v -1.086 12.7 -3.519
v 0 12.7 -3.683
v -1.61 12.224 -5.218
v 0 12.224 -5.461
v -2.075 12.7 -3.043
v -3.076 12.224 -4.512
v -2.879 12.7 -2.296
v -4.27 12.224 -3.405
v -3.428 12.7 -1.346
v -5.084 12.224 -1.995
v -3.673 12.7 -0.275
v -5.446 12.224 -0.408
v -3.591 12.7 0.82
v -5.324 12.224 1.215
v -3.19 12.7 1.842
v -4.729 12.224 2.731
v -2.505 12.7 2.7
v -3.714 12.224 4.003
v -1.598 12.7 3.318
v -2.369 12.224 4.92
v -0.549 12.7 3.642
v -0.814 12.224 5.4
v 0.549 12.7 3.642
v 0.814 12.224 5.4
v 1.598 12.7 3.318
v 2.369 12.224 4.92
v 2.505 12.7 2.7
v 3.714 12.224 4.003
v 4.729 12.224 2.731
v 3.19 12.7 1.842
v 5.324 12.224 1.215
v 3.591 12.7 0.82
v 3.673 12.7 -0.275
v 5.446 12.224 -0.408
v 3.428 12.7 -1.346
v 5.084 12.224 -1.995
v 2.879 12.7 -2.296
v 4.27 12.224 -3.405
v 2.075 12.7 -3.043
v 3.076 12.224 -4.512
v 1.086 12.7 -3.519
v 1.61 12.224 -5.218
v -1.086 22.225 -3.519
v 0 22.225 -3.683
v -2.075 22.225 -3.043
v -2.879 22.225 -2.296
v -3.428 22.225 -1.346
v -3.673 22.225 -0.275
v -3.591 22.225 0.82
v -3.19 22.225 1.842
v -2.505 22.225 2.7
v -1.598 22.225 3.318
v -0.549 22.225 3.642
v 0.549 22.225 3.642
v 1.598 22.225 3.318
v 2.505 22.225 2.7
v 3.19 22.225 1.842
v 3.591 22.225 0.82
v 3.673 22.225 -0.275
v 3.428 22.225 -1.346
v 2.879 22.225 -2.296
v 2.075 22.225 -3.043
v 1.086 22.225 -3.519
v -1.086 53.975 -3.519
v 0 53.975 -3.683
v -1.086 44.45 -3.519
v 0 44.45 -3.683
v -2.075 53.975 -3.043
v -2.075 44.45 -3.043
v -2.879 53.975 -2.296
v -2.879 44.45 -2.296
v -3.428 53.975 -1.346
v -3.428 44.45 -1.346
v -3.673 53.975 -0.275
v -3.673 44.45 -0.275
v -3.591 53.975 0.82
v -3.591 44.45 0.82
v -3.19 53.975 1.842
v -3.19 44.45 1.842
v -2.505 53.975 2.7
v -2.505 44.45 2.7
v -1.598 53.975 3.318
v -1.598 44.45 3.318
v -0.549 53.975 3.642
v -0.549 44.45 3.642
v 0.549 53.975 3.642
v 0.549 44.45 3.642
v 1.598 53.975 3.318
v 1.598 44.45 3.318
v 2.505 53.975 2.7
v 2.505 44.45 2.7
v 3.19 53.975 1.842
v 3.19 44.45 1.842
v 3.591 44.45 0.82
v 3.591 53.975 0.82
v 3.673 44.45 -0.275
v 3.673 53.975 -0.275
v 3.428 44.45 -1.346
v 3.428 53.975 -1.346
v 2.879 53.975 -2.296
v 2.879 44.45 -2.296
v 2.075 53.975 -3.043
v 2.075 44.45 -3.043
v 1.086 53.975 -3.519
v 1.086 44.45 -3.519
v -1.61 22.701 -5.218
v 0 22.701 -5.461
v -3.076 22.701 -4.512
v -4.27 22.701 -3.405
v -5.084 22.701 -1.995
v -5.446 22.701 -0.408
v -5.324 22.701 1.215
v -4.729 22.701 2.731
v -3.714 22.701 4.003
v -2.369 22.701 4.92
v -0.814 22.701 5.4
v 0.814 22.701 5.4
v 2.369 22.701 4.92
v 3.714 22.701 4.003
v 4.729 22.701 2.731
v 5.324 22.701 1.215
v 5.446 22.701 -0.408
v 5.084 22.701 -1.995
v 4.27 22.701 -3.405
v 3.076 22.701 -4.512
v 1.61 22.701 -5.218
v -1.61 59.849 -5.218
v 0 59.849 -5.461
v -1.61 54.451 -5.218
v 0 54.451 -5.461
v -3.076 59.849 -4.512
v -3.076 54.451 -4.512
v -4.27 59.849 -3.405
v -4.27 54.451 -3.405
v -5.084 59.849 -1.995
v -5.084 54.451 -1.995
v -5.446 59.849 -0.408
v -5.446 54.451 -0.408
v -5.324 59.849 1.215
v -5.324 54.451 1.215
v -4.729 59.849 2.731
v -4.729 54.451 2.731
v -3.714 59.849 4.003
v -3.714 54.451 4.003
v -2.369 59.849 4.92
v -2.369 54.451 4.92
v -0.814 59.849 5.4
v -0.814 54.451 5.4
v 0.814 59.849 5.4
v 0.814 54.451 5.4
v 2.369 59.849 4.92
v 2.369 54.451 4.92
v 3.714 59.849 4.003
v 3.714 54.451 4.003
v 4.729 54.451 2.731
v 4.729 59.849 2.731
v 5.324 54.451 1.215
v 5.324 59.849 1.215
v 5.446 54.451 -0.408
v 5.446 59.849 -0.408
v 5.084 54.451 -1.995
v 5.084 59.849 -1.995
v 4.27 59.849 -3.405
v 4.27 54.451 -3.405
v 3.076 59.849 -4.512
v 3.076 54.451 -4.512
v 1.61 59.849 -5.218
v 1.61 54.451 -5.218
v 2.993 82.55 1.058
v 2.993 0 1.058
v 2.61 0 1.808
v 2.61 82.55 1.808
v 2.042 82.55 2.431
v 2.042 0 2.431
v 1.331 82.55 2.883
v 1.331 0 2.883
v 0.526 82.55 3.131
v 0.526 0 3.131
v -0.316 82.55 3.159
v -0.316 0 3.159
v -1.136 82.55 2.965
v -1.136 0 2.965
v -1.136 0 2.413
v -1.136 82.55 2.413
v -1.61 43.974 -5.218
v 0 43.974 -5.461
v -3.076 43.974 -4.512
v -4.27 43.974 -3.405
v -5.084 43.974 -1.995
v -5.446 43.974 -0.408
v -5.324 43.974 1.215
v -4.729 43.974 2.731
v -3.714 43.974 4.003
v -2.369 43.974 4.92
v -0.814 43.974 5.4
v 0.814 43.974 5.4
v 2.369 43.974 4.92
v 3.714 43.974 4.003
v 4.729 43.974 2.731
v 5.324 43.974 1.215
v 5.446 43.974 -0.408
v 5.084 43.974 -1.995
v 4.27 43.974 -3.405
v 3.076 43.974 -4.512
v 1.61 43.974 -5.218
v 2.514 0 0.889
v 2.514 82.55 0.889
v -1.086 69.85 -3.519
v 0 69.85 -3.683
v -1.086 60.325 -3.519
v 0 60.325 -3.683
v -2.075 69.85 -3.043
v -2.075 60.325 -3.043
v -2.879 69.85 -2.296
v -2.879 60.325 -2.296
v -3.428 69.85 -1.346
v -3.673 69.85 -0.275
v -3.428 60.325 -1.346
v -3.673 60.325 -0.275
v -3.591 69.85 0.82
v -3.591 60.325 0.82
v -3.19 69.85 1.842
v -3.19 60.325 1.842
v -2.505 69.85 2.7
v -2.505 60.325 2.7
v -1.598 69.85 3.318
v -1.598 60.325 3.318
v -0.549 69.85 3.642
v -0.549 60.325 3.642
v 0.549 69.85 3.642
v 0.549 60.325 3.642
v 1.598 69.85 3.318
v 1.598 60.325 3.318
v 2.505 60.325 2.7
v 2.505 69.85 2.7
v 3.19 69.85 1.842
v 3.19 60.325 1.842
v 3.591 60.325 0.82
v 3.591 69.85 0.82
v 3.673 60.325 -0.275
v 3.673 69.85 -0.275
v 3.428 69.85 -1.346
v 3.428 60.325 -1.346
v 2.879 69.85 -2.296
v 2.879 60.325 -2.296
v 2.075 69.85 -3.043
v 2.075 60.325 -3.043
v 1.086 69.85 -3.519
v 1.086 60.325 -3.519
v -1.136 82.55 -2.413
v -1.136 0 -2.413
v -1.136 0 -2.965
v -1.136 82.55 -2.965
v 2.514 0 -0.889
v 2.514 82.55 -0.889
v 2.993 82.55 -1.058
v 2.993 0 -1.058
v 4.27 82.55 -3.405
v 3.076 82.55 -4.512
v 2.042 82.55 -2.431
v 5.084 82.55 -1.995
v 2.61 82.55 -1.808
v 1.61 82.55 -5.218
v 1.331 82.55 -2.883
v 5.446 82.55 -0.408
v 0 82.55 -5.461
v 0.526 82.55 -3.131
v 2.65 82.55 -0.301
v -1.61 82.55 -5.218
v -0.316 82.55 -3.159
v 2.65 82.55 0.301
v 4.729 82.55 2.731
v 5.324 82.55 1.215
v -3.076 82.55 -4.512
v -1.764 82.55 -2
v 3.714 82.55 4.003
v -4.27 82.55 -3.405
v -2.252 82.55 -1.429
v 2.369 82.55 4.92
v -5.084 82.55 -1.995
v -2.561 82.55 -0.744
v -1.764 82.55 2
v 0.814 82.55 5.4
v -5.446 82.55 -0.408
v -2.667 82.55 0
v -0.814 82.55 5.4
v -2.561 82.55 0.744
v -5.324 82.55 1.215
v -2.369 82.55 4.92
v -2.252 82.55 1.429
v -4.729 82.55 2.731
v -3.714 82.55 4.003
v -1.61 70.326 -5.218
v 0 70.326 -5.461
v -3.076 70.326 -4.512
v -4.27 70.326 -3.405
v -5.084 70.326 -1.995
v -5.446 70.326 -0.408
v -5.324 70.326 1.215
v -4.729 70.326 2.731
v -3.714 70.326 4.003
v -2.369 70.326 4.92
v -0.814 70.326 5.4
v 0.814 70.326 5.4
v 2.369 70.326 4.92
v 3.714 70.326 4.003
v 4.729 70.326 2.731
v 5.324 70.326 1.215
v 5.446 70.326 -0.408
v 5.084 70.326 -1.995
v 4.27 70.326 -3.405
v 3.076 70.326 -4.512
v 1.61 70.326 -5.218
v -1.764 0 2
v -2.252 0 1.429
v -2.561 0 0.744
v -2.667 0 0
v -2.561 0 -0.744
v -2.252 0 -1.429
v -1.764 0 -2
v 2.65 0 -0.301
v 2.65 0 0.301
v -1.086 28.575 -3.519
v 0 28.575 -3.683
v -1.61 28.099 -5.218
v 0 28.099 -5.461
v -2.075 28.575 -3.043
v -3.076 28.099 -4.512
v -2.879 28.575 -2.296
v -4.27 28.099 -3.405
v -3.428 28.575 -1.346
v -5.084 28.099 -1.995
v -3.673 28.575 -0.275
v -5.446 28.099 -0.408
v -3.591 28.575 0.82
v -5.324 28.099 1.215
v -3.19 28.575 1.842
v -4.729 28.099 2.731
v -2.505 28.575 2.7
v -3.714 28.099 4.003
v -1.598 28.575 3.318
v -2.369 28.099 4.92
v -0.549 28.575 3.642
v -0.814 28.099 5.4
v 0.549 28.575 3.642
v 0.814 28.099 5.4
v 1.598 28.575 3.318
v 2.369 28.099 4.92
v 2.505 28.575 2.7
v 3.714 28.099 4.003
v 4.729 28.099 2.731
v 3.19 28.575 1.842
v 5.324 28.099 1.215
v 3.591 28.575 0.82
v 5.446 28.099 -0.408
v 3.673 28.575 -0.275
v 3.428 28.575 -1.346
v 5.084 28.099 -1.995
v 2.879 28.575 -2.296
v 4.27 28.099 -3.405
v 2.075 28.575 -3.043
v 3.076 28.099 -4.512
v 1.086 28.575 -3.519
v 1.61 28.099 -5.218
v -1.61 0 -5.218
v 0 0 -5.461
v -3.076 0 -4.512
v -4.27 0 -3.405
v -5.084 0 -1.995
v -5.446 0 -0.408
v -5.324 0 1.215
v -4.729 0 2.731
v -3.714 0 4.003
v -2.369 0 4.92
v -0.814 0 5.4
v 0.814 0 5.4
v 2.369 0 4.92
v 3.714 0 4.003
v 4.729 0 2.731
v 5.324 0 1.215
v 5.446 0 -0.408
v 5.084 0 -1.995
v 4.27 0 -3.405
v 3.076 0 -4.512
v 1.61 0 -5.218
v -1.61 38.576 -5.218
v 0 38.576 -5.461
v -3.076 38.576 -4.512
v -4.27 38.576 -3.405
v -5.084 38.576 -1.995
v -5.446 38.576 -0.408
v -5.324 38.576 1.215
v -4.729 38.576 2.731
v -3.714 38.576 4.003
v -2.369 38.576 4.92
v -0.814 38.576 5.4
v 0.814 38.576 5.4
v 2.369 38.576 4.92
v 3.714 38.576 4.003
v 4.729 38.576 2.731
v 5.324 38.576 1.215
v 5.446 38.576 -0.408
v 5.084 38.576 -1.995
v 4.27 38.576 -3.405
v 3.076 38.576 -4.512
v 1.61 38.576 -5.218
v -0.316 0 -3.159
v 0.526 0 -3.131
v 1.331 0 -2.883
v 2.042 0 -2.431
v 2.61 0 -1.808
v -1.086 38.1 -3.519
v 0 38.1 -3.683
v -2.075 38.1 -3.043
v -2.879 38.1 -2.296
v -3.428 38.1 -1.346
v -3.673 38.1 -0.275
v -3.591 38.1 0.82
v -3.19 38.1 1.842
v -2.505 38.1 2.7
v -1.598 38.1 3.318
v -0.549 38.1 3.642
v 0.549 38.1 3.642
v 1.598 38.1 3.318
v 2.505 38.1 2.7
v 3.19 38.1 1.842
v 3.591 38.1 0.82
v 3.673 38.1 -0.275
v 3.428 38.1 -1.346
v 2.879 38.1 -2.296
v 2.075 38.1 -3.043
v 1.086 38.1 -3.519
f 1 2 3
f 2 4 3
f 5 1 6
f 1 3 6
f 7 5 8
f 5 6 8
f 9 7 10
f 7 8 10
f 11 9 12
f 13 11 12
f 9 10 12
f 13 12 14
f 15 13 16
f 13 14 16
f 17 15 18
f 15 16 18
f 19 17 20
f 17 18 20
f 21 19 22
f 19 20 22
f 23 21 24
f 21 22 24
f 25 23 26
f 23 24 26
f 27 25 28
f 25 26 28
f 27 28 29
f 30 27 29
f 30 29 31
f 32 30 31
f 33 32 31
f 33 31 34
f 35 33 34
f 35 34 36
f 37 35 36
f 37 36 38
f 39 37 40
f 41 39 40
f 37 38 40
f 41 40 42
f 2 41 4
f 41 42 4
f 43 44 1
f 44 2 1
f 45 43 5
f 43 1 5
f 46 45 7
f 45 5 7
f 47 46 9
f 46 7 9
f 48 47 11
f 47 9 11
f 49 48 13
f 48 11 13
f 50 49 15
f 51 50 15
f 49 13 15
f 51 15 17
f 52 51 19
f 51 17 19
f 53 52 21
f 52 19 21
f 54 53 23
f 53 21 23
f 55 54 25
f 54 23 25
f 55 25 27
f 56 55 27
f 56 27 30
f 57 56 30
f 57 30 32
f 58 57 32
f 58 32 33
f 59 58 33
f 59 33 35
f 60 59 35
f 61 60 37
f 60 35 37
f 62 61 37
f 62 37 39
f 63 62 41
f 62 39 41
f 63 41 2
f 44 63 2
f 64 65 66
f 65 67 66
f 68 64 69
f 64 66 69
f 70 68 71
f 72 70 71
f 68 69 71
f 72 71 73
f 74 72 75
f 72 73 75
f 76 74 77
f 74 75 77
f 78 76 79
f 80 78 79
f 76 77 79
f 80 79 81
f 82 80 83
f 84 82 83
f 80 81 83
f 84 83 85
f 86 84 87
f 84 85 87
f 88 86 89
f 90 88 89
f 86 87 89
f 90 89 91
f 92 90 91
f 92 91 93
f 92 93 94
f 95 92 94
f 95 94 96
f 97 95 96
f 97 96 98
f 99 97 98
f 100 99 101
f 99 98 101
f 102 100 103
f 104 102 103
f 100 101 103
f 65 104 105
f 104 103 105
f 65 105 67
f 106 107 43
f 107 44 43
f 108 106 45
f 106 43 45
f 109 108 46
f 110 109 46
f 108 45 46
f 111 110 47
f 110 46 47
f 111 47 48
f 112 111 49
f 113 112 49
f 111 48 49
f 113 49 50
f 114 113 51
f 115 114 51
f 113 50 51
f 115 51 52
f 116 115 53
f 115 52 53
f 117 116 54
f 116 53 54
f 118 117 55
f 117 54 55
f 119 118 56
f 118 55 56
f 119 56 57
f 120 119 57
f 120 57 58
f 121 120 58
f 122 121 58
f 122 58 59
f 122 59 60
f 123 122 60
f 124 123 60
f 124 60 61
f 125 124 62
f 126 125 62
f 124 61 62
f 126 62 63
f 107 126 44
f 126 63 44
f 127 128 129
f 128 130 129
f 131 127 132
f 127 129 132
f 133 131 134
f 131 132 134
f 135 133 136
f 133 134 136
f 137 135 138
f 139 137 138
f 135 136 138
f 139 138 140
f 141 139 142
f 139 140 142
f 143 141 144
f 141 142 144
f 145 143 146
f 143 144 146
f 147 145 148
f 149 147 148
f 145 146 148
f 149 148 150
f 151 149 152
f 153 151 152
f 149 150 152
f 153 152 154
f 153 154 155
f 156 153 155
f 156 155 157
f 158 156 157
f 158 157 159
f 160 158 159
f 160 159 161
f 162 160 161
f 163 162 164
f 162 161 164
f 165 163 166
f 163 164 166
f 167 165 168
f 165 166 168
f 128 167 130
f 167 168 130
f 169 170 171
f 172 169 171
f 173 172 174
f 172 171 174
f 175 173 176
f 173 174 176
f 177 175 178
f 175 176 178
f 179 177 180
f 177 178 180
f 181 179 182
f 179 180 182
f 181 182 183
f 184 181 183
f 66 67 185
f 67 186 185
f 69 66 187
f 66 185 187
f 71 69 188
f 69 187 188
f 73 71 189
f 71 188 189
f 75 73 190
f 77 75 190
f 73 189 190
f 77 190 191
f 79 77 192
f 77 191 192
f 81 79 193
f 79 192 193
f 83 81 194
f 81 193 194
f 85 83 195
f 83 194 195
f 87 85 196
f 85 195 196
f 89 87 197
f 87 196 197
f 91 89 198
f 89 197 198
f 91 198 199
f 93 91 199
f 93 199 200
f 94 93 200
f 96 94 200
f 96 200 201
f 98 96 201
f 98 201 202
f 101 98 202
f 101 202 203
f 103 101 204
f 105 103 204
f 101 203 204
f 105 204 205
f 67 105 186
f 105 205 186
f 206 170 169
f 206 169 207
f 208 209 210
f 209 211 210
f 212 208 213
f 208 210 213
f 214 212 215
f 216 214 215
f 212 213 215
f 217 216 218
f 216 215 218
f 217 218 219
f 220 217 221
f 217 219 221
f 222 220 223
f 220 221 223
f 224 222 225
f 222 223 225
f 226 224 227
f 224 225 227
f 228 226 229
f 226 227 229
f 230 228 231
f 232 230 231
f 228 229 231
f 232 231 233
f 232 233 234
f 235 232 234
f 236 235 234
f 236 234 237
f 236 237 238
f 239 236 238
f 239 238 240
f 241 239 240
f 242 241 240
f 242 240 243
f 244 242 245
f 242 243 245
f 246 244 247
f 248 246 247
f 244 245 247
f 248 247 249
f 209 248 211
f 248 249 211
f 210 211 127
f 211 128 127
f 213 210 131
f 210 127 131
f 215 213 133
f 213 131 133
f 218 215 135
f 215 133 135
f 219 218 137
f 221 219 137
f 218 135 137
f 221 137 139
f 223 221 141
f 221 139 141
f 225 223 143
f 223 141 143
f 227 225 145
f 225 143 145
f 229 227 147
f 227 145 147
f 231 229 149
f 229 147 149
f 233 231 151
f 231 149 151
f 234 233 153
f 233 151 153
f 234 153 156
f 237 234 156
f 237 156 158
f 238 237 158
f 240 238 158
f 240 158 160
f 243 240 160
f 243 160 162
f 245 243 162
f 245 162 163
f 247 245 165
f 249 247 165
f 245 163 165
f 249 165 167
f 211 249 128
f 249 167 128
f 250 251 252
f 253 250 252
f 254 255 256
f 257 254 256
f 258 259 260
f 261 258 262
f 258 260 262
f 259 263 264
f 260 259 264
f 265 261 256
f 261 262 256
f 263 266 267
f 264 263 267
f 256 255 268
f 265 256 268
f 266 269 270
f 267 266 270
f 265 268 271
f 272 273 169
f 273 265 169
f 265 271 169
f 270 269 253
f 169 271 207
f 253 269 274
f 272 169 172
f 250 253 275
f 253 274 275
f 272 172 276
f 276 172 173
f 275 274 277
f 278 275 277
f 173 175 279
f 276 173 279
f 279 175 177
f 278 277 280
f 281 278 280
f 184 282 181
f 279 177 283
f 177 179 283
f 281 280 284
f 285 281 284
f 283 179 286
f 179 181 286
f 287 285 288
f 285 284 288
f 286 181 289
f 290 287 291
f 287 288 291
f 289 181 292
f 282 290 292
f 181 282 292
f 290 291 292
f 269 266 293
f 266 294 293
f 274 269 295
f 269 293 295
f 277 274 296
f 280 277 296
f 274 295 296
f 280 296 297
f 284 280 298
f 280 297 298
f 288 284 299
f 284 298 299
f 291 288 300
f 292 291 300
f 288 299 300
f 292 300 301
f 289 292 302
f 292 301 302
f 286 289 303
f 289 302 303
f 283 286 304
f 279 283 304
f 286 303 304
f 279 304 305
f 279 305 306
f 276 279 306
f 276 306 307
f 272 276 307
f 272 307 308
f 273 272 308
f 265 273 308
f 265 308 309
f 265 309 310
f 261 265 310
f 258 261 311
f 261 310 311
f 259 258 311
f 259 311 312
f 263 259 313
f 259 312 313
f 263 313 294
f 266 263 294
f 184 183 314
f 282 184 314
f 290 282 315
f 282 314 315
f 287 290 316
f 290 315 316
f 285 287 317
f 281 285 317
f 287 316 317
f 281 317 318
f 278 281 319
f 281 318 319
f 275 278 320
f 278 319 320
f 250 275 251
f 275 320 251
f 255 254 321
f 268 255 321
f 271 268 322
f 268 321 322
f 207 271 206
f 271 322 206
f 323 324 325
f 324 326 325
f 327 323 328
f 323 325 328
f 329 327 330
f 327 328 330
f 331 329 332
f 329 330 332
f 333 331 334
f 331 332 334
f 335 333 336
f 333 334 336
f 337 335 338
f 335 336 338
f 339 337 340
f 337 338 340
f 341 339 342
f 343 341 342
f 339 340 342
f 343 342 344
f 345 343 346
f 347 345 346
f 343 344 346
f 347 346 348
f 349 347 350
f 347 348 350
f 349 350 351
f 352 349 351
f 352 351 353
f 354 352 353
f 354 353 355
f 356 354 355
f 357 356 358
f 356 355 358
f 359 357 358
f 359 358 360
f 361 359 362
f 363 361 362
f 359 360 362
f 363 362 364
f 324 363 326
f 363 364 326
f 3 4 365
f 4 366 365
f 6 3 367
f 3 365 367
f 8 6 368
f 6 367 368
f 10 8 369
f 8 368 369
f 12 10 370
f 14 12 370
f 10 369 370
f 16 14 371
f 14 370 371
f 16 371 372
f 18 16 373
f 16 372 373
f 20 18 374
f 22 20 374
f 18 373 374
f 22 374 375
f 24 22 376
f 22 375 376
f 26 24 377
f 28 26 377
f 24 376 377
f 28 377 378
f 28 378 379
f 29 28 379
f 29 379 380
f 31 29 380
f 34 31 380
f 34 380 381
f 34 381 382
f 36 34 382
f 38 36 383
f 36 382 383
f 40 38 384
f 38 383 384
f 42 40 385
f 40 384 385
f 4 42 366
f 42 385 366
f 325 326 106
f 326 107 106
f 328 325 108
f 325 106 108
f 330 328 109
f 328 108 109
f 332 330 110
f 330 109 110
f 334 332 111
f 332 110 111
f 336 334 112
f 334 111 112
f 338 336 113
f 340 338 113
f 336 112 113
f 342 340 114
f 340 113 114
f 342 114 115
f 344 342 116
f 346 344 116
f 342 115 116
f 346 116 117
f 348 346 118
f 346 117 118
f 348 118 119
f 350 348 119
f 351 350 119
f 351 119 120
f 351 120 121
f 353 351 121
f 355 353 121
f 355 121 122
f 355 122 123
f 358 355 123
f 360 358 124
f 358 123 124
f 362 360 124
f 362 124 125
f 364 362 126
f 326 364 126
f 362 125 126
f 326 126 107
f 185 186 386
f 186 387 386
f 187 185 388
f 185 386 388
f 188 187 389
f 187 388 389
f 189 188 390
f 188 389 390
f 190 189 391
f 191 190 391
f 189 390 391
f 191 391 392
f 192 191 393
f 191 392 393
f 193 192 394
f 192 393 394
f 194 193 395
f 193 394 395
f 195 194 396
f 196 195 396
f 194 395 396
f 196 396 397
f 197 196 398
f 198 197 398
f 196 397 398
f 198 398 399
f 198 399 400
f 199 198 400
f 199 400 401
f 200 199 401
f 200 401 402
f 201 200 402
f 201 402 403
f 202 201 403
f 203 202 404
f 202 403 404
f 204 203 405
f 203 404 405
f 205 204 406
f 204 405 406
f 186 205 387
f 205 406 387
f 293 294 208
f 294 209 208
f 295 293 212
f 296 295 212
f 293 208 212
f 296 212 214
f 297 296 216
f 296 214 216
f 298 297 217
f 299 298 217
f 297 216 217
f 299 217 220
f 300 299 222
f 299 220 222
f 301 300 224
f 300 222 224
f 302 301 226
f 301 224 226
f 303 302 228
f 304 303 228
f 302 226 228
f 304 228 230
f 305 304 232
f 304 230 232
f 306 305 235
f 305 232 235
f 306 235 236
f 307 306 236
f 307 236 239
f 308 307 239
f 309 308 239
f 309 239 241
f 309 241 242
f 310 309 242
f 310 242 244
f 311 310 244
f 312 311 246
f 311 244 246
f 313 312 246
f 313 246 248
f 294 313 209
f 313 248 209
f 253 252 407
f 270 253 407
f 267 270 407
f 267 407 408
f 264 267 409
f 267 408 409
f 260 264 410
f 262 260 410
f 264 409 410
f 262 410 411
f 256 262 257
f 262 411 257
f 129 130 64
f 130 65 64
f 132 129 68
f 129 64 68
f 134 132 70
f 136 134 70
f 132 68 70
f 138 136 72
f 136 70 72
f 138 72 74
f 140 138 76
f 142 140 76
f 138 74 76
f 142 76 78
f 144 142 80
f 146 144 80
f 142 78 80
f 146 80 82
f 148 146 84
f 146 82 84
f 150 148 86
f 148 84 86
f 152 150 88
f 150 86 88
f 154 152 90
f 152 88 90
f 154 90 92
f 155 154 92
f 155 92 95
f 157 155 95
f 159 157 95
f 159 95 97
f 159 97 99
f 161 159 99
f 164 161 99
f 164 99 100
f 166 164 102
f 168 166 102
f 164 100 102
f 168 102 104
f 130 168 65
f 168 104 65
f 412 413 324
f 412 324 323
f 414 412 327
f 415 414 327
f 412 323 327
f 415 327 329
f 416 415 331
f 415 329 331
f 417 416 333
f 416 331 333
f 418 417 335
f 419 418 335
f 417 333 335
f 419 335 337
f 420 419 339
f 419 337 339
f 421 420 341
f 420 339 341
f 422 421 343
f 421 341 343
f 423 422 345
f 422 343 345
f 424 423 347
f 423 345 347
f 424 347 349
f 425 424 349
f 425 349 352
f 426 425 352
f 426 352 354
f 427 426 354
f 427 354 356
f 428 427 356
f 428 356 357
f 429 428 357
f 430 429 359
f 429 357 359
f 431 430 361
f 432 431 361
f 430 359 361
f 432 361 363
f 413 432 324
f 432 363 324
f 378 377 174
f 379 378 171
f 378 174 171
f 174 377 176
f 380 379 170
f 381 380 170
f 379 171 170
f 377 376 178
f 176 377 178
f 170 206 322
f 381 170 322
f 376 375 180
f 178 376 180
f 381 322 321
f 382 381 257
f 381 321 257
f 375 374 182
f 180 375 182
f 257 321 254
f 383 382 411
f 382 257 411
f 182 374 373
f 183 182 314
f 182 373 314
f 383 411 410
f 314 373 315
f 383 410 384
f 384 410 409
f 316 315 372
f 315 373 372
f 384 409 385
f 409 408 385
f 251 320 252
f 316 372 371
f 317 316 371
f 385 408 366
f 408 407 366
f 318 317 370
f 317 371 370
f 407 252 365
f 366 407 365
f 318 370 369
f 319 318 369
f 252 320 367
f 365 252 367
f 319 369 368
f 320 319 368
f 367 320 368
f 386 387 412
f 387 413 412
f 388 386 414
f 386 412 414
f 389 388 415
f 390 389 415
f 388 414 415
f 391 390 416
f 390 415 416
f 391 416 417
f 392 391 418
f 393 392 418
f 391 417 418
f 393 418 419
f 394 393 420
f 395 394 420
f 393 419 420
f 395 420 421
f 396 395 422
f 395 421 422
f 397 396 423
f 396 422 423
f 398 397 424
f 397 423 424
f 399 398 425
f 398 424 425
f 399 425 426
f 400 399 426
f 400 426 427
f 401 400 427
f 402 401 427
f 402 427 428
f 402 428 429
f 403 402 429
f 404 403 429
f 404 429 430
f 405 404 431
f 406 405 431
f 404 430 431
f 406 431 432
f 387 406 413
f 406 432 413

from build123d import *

# Parameters (mm, degrees)
POCKET_DEPTH = 82.551


with BuildPart() as part:
    # Sketch → Revolution (revolve)
    with BuildSketch(Plane.YZ):
        Polygon((0, 0), (82.55, 0), (82.55, -5.461), (70.326414, -5.461), (69.85, -3.683), (60.325, -3.683), (59.848586, -5.461), (54.451414, -5.461), (53.975, -3.683), (44.45, -3.683), (43.973586, -5.461), (38.576414, -5.461), (38.1, -3.683), (28.575, -3.683), (28.098586, -5.461), (22.701414, -5.461), (22.225, -3.683), (12.7, -3.683), (12.223586, -5.461), (0, -5.461), align=None)
    revolve(axis=Axis((0, 0, 0), (0, 1, 0)))

    # Sketch002 → Pocket (cut, through all)
    with BuildSketch(Plane.XZ):
        with BuildLine():
            ThreePointArc((-1.135923, 2.413), (-2.667, 0), (-1.135923, -2.413))
            Line((-1.135923, -2.413), (-1.135923, -2.964845))
            ThreePointArc((-1.135923, -2.964845), (1.330891, -2.882595), (2.993419, -1.058333))
            Line((2.514472, -0.889), (2.993419, -1.058333))
            ThreePointArc((2.514472, -0.889), (2.667, 0), (2.514472, 0.889))
            Line((2.993419, 1.058333), (2.514472, 0.889))
            ThreePointArc((2.993419, 1.058333), (1.330891, 2.882595), (-1.135923, 2.964845))
            Line((-1.135923, 2.964845), (-1.135923, 2.413))
        make_face()
    extrude(amount=-POCKET_DEPTH, mode=Mode.SUBTRACT)


solid = part.part
